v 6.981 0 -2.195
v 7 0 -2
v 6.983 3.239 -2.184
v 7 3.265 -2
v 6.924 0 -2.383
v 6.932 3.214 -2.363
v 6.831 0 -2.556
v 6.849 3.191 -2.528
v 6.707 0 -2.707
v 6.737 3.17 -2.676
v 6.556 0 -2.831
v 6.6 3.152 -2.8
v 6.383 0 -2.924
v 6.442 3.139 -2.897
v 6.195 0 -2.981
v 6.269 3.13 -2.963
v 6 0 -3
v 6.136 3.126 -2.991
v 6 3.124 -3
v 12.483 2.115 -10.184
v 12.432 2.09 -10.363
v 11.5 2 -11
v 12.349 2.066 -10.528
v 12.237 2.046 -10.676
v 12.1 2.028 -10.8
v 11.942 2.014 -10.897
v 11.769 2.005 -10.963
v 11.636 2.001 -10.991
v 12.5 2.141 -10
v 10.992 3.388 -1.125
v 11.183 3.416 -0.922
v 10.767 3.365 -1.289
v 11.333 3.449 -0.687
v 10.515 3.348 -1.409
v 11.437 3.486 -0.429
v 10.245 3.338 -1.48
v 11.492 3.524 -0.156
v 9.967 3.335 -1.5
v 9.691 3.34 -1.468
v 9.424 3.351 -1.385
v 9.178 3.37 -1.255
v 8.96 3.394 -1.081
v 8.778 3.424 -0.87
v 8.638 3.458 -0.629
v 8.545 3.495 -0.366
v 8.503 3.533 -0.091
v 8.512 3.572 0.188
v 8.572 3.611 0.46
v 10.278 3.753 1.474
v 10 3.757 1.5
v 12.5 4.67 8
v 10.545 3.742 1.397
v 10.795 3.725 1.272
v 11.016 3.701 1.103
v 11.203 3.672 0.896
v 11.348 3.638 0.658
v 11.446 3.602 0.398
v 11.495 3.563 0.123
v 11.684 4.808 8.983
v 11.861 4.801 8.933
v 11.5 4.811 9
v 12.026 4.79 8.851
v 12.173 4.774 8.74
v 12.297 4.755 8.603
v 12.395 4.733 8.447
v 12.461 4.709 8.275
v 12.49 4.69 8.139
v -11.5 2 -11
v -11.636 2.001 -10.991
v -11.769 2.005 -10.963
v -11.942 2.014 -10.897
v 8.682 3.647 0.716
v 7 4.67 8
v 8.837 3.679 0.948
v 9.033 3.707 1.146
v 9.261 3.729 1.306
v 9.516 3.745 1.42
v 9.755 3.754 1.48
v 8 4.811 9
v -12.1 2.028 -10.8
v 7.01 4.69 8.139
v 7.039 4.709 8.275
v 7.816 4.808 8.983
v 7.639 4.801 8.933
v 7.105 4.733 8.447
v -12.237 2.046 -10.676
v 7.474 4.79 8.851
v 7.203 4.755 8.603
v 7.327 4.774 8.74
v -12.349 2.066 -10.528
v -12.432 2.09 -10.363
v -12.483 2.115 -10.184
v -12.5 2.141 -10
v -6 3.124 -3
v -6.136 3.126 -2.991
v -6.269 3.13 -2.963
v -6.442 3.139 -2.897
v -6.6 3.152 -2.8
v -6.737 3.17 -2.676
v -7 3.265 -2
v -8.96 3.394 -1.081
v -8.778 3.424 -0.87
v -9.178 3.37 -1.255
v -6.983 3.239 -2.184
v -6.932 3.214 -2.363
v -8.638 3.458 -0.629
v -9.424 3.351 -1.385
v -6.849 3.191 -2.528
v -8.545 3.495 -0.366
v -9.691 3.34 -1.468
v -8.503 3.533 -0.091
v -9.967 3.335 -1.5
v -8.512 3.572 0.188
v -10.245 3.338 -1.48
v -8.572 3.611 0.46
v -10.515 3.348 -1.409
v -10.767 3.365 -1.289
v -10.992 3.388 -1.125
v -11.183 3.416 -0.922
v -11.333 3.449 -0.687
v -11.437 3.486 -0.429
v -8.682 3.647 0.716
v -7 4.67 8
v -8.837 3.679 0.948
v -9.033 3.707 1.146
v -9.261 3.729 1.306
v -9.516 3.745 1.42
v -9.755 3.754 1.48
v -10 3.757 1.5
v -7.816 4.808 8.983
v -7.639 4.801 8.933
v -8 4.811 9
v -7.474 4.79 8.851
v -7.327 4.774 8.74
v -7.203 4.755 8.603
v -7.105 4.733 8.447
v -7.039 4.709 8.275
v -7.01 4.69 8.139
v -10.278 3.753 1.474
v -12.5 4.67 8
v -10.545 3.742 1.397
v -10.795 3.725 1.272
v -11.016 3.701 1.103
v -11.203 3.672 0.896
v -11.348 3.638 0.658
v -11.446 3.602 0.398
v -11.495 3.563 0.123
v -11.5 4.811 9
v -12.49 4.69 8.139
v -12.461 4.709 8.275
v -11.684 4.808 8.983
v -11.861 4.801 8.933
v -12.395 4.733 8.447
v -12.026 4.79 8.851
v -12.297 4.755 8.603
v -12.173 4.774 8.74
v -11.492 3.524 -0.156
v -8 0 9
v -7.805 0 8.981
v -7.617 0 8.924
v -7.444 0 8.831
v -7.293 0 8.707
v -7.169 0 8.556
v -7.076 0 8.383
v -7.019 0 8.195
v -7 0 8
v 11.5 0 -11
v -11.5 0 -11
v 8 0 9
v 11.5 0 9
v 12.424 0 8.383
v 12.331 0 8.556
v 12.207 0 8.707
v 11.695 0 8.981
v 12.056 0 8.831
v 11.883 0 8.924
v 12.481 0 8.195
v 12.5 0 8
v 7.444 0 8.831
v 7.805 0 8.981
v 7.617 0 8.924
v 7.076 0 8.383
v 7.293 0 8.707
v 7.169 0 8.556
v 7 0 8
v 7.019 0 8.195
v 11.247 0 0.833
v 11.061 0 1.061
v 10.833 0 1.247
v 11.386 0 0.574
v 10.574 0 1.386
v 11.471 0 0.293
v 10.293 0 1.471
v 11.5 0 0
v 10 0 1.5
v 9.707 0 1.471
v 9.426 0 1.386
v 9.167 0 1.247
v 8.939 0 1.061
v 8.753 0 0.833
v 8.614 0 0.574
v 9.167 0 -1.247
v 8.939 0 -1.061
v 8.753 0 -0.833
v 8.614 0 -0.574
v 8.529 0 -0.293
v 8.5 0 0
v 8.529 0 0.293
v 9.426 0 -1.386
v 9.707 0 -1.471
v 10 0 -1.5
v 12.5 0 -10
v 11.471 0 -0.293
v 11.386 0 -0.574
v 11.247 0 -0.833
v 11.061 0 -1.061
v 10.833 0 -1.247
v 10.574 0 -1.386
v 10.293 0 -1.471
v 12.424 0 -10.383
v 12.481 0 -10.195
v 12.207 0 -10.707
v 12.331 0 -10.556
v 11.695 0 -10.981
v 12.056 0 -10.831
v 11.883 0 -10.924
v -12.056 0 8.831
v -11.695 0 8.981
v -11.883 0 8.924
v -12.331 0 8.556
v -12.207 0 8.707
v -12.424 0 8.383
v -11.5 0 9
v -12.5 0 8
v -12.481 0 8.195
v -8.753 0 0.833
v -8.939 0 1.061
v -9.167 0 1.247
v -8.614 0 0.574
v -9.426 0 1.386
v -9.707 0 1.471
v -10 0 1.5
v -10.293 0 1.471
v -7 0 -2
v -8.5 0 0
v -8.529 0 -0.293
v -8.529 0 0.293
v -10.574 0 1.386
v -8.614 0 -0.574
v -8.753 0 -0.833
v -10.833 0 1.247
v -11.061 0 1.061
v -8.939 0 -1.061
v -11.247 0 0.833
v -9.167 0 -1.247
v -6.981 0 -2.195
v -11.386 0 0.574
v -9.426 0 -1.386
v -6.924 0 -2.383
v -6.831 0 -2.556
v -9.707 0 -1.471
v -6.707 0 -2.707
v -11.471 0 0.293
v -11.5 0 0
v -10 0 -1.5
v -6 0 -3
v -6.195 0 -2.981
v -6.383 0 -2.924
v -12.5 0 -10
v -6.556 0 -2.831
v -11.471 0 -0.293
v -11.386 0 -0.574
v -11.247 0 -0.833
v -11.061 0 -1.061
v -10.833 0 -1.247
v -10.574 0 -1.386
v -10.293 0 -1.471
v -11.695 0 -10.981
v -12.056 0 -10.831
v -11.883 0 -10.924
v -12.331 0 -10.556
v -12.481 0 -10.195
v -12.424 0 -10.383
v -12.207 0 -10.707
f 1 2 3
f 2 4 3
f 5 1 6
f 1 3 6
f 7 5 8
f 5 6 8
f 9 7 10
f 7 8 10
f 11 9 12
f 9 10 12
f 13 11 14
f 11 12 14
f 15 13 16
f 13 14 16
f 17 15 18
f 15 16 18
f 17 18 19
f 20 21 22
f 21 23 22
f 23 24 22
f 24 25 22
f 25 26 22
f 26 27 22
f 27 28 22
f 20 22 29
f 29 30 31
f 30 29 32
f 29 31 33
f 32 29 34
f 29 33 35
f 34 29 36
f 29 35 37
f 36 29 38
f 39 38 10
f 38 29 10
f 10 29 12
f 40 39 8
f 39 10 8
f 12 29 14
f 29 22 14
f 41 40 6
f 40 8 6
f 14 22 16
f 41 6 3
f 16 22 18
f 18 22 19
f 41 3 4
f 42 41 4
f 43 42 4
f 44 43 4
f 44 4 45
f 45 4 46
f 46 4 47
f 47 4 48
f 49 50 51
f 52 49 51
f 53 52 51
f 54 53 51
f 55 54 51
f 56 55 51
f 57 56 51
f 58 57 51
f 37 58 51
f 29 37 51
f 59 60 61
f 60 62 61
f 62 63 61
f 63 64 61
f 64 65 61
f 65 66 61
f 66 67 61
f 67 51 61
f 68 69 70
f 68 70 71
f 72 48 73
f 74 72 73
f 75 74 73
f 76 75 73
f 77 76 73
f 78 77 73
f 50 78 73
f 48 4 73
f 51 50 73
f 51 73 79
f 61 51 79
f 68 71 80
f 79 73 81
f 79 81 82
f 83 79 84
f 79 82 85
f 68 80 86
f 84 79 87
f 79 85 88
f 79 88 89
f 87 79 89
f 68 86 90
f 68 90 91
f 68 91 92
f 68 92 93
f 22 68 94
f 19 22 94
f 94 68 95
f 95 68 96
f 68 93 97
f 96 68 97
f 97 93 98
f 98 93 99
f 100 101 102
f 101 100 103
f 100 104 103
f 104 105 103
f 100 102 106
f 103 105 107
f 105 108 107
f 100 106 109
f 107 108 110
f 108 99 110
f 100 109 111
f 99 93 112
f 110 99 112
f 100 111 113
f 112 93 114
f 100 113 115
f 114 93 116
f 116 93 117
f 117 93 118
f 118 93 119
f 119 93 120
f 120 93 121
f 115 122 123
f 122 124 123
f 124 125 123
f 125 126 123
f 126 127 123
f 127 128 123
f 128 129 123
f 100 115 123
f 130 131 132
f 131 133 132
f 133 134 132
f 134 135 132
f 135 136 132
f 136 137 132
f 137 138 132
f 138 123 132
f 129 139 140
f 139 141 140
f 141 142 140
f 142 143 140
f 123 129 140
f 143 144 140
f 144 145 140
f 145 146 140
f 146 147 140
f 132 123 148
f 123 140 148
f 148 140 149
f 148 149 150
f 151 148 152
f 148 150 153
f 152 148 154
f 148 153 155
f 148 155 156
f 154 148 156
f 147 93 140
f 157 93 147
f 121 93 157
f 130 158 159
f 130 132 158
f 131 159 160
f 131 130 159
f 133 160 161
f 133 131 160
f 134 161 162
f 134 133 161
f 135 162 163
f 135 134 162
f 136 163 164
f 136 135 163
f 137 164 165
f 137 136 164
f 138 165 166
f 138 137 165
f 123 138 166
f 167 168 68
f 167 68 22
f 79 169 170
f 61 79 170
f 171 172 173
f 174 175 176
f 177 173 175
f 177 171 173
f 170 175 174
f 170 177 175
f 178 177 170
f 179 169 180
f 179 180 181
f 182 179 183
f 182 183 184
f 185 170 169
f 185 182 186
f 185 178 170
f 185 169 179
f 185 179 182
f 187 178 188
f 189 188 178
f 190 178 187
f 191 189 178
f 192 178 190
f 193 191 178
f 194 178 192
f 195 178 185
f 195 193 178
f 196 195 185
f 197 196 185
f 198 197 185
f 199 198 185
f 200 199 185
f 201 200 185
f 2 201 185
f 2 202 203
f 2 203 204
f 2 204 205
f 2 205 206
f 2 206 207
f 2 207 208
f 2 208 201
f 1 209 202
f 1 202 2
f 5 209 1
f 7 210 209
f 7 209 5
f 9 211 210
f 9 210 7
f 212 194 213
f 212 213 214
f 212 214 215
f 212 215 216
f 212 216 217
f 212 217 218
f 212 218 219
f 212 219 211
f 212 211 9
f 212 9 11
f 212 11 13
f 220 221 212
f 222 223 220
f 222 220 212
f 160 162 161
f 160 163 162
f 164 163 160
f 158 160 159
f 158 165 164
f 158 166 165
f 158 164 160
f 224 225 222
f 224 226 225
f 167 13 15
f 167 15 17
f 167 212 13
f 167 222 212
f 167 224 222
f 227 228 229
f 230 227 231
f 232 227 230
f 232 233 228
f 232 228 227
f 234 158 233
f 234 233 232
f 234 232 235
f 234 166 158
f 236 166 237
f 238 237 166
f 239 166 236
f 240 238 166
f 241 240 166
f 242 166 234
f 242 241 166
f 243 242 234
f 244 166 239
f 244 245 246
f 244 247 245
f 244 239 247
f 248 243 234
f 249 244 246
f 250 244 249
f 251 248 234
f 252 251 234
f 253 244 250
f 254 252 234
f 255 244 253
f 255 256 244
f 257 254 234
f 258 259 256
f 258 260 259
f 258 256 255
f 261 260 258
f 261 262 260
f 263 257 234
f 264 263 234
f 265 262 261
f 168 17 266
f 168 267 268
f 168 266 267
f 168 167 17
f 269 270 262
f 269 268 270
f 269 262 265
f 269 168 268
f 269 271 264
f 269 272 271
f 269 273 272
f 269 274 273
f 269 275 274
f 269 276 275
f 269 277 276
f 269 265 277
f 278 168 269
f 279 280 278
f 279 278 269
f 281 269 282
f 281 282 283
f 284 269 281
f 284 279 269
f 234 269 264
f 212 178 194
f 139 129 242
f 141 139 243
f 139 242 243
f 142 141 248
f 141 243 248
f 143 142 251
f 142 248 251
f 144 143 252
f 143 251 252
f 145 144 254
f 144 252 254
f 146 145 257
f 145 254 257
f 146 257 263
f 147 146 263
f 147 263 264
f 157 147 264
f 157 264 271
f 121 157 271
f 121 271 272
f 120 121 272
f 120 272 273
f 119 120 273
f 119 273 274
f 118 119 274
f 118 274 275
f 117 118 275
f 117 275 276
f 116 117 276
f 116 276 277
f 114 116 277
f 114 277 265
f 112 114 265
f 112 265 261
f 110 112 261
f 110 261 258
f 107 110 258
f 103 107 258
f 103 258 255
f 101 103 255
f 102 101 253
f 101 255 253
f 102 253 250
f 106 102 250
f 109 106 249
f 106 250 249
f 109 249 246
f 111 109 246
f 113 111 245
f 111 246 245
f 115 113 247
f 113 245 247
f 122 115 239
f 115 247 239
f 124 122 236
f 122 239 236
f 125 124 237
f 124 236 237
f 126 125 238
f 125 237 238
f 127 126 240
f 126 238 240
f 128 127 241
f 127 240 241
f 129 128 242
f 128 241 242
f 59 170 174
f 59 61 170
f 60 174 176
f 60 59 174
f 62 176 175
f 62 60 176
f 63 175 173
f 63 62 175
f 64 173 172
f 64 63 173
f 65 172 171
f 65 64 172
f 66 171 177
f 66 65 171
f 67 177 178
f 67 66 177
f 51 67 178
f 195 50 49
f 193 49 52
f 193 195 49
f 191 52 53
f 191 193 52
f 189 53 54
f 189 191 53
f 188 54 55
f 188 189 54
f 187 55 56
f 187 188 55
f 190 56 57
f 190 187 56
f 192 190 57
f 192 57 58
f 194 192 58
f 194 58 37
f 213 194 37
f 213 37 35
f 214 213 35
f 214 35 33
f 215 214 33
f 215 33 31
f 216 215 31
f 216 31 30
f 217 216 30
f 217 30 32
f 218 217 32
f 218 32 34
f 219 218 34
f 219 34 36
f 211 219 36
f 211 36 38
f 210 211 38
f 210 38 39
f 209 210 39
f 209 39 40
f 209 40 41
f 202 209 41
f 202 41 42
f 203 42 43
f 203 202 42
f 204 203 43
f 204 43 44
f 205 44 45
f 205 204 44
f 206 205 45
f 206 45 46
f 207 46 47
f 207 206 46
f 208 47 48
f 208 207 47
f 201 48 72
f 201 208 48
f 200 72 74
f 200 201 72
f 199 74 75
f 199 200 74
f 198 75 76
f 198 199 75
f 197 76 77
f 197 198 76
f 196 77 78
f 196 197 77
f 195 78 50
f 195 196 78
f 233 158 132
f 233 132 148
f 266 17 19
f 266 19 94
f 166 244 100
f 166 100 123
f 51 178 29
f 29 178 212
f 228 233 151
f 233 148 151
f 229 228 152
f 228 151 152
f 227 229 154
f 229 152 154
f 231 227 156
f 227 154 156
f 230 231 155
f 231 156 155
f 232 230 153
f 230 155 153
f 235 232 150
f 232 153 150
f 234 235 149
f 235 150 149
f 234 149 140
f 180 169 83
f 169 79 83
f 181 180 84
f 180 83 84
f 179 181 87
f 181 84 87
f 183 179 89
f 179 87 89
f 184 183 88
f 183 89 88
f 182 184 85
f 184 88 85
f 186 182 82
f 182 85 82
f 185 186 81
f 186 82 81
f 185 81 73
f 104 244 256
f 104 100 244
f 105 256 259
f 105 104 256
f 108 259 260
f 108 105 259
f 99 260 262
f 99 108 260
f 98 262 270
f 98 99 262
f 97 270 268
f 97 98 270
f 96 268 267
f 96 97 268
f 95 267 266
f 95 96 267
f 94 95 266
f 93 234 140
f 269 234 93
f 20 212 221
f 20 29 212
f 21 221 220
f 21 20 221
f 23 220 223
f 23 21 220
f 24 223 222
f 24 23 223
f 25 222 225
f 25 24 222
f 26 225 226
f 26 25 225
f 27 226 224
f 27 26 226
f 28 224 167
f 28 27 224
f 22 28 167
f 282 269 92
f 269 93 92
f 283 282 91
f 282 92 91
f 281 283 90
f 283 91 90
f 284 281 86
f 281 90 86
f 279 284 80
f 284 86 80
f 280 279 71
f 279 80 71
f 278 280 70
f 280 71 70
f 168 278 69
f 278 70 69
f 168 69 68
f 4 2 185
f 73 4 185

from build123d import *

# Parameters (mm, degrees)
ESQUISSE1_R             = 1.5
BOSS_EXTRU_1_DEPTH      = 10
ENL_V_MAT_EXTRU_1_DEPTH = 20.4229246
CONG_1_R                = 1


with BuildPart() as part:
    # Esquisse1 → Boss.-Extru.1 (new body)
    with BuildSketch(Plane(origin=(0, 0, 0), x_dir=(1, 0, 0), z_dir=(0, 1, 0))):
        Polygon((7, -9), (12.5, -9), (12.5, 11), (0, 11), (0, 3), (7, 3), align=None)
        with Locations(Location((10, 0, 0), (0, 0, 270))):
            Circle(ESQUISSE1_R, mode=Mode.SUBTRACT)
    extrude(amount=BOSS_EXTRU_1_DEPTH)

    # Esquisse2 → Enlèv. mat.-Extru.1 (cut, through all)
    with BuildSketch(Plane(origin=(12.5, 0, 0), x_dir=(0, 0, -1), z_dir=(1, 0, 0))):
        Polygon((-9, 10), (11, 10), (11, 2), (-9, 4.810816694), align=None)
    extrude(amount=-ENL_V_MAT_EXTRU_1_DEPTH, mode=Mode.SUBTRACT)

    # Congé1
    cong_1_edges = [part.edges().sort_by_distance(p)[0] for p in [
        (7, 1.562163339, -3),
        (12.5, 1, -11),
        (12.5, 2.405408347, 9),
        (7, 2.405408347, 9),
    ]]
    fillet(cong_1_edges, radius=CONG_1_R)

    # Symétrie1: part across plane


with BuildPart() as part_1:
    add(part.part)
    add(part.part.mirror(Plane(origin=(0, 10, -11), x_dir=(0, 0, 1), z_dir=(1, 0, 0))))


solid = part_1.part
